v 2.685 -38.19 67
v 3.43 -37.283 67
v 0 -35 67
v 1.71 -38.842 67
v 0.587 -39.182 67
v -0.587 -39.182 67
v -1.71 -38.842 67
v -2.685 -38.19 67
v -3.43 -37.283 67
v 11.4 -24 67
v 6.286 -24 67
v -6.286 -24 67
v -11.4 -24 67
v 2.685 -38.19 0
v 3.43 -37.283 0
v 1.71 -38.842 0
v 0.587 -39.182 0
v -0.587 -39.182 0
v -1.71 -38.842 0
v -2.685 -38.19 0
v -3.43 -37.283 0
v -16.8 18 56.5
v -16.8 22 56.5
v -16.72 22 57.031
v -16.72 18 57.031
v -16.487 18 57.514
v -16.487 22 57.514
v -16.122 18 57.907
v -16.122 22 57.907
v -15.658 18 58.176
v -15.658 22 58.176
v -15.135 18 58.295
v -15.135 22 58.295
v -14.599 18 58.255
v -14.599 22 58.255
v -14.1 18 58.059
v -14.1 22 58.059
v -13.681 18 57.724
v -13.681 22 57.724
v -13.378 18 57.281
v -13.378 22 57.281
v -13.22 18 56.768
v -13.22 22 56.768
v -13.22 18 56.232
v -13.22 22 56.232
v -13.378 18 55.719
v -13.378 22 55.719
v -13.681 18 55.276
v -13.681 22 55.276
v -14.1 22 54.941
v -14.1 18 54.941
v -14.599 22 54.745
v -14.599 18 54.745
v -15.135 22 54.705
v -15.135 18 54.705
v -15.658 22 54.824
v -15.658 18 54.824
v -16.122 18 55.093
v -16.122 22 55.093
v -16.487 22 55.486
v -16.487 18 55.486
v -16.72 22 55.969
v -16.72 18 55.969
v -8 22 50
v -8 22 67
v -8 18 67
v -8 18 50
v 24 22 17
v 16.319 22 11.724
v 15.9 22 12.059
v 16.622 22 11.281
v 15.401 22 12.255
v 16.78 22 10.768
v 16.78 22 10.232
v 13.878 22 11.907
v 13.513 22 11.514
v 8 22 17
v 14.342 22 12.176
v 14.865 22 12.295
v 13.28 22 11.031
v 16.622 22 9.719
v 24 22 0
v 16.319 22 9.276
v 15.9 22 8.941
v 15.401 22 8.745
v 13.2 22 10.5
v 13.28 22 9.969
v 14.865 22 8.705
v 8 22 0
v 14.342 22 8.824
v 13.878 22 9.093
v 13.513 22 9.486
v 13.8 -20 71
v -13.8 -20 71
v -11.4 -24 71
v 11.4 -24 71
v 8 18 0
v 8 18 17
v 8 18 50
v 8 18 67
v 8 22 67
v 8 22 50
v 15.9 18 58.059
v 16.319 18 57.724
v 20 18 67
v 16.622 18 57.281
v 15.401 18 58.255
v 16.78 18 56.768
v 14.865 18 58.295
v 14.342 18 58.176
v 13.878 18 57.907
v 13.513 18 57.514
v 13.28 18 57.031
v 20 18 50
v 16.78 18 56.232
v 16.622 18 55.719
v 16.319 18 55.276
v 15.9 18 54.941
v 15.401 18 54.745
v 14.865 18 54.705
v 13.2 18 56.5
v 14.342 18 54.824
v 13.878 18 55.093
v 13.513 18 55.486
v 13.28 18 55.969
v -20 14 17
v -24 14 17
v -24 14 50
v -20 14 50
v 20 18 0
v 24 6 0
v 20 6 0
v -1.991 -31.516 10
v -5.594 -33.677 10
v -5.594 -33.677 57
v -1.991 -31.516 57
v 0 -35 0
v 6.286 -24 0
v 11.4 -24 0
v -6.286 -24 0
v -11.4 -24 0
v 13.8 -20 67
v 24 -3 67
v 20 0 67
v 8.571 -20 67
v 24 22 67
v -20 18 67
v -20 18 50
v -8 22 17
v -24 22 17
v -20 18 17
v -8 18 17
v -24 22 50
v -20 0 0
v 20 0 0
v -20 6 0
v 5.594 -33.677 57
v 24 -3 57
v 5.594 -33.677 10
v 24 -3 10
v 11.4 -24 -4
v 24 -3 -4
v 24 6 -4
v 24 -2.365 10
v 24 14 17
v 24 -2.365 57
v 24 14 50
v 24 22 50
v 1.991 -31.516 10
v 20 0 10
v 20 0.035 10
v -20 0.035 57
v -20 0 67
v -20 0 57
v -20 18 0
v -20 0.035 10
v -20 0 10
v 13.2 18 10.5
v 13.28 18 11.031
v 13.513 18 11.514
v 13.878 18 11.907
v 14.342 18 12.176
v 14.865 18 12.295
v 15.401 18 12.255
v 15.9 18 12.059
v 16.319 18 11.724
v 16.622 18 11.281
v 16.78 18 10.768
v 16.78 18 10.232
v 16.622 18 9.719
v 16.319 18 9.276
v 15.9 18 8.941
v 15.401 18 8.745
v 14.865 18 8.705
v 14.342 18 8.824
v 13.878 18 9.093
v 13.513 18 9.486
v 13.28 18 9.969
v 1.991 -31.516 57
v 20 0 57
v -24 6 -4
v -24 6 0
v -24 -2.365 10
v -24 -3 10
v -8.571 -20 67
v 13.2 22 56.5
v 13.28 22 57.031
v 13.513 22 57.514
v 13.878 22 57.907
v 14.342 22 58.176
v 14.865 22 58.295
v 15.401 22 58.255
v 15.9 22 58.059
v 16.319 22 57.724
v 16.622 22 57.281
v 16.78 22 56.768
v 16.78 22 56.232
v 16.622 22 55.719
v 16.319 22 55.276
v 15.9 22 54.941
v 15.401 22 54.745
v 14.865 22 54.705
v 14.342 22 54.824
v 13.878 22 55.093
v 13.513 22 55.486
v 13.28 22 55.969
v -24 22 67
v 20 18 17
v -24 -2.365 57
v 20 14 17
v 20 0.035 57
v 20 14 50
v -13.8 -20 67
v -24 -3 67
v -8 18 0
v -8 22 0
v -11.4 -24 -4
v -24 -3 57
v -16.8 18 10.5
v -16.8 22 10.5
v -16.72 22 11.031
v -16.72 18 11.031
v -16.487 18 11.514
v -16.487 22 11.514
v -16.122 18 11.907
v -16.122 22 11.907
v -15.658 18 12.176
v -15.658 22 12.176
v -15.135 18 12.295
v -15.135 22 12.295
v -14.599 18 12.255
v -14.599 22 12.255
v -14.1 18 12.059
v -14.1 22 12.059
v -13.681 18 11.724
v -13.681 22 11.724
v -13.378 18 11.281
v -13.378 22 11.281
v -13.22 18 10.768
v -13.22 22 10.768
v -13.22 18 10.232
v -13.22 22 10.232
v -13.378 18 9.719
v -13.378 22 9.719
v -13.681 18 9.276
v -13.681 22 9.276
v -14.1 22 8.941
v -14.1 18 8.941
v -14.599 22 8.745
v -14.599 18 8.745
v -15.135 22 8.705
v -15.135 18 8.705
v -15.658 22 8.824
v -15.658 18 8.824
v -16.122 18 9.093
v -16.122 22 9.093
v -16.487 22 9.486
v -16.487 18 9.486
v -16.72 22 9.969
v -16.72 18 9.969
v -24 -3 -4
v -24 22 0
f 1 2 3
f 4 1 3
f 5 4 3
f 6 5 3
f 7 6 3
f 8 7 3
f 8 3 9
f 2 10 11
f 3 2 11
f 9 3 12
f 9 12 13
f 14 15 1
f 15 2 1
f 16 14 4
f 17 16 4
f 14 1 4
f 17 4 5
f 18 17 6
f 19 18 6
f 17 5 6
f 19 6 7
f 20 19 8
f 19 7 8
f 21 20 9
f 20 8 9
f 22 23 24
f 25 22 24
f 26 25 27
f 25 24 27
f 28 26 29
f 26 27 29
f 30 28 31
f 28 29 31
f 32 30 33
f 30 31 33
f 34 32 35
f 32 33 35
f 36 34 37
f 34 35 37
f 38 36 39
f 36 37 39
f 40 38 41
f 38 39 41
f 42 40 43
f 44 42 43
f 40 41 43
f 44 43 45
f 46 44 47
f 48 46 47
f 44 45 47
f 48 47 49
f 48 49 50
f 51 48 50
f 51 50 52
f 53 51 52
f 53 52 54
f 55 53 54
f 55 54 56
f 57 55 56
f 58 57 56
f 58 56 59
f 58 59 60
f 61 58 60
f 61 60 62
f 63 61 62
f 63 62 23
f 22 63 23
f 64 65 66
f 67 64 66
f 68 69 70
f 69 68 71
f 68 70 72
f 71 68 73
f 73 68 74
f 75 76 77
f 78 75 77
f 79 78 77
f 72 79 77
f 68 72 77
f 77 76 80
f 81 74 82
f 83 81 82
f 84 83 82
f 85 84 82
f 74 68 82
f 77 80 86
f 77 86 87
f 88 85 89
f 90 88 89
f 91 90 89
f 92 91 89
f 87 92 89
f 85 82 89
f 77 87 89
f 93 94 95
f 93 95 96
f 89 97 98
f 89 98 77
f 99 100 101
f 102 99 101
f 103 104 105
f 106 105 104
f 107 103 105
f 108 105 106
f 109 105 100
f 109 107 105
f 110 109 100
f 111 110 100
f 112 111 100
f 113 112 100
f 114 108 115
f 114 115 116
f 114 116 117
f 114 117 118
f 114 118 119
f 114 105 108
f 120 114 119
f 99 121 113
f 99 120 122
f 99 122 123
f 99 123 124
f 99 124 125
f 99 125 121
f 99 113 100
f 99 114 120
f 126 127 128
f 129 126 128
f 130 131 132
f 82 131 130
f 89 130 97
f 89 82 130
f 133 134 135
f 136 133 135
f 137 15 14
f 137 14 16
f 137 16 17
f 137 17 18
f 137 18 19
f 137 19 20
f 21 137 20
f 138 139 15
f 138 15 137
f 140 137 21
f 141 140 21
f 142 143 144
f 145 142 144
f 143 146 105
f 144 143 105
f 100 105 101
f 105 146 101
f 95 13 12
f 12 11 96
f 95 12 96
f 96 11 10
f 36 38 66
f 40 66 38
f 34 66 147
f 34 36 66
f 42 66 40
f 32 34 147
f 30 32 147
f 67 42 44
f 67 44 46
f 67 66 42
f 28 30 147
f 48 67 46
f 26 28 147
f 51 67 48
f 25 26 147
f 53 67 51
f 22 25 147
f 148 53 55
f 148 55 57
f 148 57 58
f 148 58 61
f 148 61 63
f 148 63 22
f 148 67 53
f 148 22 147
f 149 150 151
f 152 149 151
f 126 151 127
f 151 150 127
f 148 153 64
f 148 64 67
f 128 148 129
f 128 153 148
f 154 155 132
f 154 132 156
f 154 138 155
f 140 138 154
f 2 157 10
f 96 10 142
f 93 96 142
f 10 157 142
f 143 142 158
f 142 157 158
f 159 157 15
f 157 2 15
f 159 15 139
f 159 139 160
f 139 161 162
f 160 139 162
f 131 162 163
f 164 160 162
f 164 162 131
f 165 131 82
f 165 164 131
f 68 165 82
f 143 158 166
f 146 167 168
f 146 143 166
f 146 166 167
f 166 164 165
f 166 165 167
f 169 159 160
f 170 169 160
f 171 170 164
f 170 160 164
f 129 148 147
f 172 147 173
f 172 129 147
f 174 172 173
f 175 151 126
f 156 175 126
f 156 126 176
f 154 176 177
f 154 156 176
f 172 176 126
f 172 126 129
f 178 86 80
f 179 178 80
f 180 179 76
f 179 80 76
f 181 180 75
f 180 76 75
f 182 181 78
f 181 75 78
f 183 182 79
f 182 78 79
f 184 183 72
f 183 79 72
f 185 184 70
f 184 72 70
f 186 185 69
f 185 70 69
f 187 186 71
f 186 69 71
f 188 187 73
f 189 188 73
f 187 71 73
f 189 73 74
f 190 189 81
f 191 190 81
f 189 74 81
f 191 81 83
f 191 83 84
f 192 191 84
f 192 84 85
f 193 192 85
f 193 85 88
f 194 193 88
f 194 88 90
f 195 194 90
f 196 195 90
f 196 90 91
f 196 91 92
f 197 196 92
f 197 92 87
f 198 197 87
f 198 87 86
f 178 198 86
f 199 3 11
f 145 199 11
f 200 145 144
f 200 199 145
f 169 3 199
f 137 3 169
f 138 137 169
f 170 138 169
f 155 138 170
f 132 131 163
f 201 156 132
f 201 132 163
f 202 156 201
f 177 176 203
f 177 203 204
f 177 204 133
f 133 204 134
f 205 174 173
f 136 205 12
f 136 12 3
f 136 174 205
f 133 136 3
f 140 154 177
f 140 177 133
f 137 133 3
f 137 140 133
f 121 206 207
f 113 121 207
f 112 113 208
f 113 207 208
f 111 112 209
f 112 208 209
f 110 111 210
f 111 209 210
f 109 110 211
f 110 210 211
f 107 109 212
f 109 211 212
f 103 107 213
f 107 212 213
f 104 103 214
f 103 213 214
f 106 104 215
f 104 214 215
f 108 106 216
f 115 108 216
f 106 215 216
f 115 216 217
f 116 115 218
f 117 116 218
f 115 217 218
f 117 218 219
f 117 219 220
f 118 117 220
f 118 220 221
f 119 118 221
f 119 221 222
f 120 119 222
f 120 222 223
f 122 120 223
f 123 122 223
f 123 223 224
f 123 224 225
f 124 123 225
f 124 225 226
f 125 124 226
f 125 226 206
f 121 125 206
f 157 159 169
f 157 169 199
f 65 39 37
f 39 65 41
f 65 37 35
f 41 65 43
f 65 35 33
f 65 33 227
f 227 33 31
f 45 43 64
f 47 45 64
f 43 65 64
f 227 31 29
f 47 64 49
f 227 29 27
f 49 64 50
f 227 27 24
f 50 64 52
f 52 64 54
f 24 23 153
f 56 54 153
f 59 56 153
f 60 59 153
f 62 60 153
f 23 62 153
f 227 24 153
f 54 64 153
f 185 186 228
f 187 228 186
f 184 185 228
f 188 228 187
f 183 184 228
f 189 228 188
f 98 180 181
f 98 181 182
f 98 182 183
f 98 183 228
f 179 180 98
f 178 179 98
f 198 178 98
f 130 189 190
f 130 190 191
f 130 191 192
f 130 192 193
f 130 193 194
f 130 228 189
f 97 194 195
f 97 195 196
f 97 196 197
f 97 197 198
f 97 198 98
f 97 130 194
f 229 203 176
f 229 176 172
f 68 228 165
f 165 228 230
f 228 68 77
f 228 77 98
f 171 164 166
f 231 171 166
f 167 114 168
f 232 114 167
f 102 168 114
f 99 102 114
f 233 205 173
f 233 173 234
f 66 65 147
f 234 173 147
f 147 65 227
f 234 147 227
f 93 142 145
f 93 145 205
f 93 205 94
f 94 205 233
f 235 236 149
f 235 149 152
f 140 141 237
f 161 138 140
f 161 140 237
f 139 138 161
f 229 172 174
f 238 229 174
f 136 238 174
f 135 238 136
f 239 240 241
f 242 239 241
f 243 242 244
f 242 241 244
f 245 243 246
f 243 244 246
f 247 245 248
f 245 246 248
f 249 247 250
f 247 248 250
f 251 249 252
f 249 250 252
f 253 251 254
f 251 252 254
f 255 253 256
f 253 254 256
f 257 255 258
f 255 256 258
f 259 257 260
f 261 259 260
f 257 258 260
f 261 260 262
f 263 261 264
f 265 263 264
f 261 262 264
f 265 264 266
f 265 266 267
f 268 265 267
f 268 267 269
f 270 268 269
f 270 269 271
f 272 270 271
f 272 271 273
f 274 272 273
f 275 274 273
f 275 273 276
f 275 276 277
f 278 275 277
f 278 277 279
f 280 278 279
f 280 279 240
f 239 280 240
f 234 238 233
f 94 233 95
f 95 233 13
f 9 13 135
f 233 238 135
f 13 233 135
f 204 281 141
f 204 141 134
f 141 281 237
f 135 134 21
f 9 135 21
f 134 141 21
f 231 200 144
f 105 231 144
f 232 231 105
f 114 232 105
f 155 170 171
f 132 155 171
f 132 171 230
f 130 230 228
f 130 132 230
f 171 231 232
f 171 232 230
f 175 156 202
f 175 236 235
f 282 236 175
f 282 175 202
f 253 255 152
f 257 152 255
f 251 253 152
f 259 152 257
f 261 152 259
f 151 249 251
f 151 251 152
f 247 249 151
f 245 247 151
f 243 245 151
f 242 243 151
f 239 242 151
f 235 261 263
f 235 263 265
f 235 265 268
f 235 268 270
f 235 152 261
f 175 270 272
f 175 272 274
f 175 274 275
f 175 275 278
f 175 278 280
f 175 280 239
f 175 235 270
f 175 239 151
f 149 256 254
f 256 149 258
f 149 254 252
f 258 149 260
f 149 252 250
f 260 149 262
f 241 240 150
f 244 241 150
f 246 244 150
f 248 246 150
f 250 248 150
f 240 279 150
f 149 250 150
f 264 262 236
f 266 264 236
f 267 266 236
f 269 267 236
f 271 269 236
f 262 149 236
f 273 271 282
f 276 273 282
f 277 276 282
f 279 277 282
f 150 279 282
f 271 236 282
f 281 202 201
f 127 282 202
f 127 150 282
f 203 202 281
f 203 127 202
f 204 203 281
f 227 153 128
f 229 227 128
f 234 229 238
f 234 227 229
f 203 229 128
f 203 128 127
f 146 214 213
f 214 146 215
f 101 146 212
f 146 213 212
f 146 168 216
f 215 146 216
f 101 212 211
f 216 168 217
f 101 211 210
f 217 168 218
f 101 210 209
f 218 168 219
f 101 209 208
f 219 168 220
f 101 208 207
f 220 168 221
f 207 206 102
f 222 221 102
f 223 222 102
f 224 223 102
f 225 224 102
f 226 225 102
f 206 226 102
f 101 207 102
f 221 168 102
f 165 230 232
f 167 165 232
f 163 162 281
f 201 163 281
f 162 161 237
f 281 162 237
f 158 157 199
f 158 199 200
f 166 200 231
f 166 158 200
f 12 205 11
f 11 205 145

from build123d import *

# Parameters (mm, degrees)
PAD_DEPTH       = 67
SKETCH001_R     = 1.8
POCKET_DEPTH    = 5
SKETCH002_W     = 36.32
SKETCH002_H     = 47
POCKET001_DEPTH = 5
SKETCH003_W     = 36.32
SKETCH003_H     = 47
POCKET002_DEPTH = 5
FILLET_R        = 4
PAD001_DEPTH    = 4
PAD002_DEPTH    = 4
SKETCH006_W     = 8
SKETCH006_H     = 33
POCKET003_DEPTH = 100


with BuildPart() as part:
    # Sketch → Pad (new body)
    with BuildSketch(Plane.XY):
        Polygon((20, 22), (24, 22), (24, 0), (24, -3), (0, -43), (-24, -3), (-24, 0), (-24, 22), (-20, 22), (-8, 22), (-8, 18), (-20, 18), (-20, 0), (0, -35), (20, 0), (20, 18), (8, 18), (8, 22), align=None)
    extrude(amount=PAD_DEPTH)

    # Sketch001 (on Face10 of Pad) → Pocket (cut)
    with BuildSketch(Plane(origin=(0, 22, 0), x_dir=(-1, 0, 0), z_dir=(0, 1, 0))):
        with Locations((15, 56.5)):
            Circle(SKETCH001_R)
        with Locations((15, 10.5)):
            Circle(SKETCH001_R)
        with Locations((-15, 56.5)):
            Circle(SKETCH001_R)
        with Locations((-15, 10.5)):
            Circle(SKETCH001_R)
    extrude(amount=-POCKET_DEPTH, mode=Mode.SUBTRACT)

    # Sketch002 (on Face11 of Pocket) → Pocket001 (cut)
    with BuildSketch(Plane(origin=(-18.9705882353, -11.3823529412, 0), x_dir=(0.5144957554, -0.8574929257, 0), z_dir=(-0.8574929257, -0.5144957554, 0))):
        with Locations((7.84, 33.5)):
            Rectangle(SKETCH002_W, SKETCH002_H)
    extrude(amount=-POCKET001_DEPTH, mode=Mode.SUBTRACT)

    # Sketch003 (on Face10 of Pocket001) → Pocket002 (cut)
    with BuildSketch(Plane(origin=(18.9705882353, -11.3823529412, 0), x_dir=(0.5144957554, 0.8574929257, 0), z_dir=(0.8574929257, -0.5144957554, 0))):
        with Locations((-7.84, 33.5)):
            Rectangle(SKETCH003_W, SKETCH003_H)
    extrude(amount=-POCKET002_DEPTH, mode=Mode.SUBTRACT)

    # Fillet
    fillet_edges = [part.edges().sort_by_distance(p)[0] for p in [
        (0, -43, 33.5),
    ]]
    fillet(fillet_edges, radius=FILLET_R)

    # Sketch004 (on Face19 of Pad) → Pad001 (join)
    with BuildSketch(Plane(origin=(0, 0, 0), x_dir=(1, 0, 0), z_dir=(0, 0, -1))):
        Polygon((24, 3), (24, -6), (-24, -6), (-24, 3), (-11.4, 24), (11.4, 24), align=None)
    extrude(amount=PAD001_DEPTH)

    # Sketch005 → Pad002 (join)
    with BuildSketch(Plane.XY.offset(67)):
        Polygon((13.8, -20), (-13.8, -20), (-11.4, -24), (11.4, -24), align=None)
    extrude(amount=PAD002_DEPTH)

    # Sketch006 (on Face17 of Pad002) → Pocket003 (cut)
    with BuildSketch(Plane(origin=(-24, 0, 0), x_dir=(0, -1, 0), z_dir=(-1, 0, 0))):
        with Locations((-18, 33.5)):
            Rectangle(SKETCH006_W, SKETCH006_H)
    extrude(amount=-POCKET003_DEPTH, mode=Mode.SUBTRACT)


solid = part.part
